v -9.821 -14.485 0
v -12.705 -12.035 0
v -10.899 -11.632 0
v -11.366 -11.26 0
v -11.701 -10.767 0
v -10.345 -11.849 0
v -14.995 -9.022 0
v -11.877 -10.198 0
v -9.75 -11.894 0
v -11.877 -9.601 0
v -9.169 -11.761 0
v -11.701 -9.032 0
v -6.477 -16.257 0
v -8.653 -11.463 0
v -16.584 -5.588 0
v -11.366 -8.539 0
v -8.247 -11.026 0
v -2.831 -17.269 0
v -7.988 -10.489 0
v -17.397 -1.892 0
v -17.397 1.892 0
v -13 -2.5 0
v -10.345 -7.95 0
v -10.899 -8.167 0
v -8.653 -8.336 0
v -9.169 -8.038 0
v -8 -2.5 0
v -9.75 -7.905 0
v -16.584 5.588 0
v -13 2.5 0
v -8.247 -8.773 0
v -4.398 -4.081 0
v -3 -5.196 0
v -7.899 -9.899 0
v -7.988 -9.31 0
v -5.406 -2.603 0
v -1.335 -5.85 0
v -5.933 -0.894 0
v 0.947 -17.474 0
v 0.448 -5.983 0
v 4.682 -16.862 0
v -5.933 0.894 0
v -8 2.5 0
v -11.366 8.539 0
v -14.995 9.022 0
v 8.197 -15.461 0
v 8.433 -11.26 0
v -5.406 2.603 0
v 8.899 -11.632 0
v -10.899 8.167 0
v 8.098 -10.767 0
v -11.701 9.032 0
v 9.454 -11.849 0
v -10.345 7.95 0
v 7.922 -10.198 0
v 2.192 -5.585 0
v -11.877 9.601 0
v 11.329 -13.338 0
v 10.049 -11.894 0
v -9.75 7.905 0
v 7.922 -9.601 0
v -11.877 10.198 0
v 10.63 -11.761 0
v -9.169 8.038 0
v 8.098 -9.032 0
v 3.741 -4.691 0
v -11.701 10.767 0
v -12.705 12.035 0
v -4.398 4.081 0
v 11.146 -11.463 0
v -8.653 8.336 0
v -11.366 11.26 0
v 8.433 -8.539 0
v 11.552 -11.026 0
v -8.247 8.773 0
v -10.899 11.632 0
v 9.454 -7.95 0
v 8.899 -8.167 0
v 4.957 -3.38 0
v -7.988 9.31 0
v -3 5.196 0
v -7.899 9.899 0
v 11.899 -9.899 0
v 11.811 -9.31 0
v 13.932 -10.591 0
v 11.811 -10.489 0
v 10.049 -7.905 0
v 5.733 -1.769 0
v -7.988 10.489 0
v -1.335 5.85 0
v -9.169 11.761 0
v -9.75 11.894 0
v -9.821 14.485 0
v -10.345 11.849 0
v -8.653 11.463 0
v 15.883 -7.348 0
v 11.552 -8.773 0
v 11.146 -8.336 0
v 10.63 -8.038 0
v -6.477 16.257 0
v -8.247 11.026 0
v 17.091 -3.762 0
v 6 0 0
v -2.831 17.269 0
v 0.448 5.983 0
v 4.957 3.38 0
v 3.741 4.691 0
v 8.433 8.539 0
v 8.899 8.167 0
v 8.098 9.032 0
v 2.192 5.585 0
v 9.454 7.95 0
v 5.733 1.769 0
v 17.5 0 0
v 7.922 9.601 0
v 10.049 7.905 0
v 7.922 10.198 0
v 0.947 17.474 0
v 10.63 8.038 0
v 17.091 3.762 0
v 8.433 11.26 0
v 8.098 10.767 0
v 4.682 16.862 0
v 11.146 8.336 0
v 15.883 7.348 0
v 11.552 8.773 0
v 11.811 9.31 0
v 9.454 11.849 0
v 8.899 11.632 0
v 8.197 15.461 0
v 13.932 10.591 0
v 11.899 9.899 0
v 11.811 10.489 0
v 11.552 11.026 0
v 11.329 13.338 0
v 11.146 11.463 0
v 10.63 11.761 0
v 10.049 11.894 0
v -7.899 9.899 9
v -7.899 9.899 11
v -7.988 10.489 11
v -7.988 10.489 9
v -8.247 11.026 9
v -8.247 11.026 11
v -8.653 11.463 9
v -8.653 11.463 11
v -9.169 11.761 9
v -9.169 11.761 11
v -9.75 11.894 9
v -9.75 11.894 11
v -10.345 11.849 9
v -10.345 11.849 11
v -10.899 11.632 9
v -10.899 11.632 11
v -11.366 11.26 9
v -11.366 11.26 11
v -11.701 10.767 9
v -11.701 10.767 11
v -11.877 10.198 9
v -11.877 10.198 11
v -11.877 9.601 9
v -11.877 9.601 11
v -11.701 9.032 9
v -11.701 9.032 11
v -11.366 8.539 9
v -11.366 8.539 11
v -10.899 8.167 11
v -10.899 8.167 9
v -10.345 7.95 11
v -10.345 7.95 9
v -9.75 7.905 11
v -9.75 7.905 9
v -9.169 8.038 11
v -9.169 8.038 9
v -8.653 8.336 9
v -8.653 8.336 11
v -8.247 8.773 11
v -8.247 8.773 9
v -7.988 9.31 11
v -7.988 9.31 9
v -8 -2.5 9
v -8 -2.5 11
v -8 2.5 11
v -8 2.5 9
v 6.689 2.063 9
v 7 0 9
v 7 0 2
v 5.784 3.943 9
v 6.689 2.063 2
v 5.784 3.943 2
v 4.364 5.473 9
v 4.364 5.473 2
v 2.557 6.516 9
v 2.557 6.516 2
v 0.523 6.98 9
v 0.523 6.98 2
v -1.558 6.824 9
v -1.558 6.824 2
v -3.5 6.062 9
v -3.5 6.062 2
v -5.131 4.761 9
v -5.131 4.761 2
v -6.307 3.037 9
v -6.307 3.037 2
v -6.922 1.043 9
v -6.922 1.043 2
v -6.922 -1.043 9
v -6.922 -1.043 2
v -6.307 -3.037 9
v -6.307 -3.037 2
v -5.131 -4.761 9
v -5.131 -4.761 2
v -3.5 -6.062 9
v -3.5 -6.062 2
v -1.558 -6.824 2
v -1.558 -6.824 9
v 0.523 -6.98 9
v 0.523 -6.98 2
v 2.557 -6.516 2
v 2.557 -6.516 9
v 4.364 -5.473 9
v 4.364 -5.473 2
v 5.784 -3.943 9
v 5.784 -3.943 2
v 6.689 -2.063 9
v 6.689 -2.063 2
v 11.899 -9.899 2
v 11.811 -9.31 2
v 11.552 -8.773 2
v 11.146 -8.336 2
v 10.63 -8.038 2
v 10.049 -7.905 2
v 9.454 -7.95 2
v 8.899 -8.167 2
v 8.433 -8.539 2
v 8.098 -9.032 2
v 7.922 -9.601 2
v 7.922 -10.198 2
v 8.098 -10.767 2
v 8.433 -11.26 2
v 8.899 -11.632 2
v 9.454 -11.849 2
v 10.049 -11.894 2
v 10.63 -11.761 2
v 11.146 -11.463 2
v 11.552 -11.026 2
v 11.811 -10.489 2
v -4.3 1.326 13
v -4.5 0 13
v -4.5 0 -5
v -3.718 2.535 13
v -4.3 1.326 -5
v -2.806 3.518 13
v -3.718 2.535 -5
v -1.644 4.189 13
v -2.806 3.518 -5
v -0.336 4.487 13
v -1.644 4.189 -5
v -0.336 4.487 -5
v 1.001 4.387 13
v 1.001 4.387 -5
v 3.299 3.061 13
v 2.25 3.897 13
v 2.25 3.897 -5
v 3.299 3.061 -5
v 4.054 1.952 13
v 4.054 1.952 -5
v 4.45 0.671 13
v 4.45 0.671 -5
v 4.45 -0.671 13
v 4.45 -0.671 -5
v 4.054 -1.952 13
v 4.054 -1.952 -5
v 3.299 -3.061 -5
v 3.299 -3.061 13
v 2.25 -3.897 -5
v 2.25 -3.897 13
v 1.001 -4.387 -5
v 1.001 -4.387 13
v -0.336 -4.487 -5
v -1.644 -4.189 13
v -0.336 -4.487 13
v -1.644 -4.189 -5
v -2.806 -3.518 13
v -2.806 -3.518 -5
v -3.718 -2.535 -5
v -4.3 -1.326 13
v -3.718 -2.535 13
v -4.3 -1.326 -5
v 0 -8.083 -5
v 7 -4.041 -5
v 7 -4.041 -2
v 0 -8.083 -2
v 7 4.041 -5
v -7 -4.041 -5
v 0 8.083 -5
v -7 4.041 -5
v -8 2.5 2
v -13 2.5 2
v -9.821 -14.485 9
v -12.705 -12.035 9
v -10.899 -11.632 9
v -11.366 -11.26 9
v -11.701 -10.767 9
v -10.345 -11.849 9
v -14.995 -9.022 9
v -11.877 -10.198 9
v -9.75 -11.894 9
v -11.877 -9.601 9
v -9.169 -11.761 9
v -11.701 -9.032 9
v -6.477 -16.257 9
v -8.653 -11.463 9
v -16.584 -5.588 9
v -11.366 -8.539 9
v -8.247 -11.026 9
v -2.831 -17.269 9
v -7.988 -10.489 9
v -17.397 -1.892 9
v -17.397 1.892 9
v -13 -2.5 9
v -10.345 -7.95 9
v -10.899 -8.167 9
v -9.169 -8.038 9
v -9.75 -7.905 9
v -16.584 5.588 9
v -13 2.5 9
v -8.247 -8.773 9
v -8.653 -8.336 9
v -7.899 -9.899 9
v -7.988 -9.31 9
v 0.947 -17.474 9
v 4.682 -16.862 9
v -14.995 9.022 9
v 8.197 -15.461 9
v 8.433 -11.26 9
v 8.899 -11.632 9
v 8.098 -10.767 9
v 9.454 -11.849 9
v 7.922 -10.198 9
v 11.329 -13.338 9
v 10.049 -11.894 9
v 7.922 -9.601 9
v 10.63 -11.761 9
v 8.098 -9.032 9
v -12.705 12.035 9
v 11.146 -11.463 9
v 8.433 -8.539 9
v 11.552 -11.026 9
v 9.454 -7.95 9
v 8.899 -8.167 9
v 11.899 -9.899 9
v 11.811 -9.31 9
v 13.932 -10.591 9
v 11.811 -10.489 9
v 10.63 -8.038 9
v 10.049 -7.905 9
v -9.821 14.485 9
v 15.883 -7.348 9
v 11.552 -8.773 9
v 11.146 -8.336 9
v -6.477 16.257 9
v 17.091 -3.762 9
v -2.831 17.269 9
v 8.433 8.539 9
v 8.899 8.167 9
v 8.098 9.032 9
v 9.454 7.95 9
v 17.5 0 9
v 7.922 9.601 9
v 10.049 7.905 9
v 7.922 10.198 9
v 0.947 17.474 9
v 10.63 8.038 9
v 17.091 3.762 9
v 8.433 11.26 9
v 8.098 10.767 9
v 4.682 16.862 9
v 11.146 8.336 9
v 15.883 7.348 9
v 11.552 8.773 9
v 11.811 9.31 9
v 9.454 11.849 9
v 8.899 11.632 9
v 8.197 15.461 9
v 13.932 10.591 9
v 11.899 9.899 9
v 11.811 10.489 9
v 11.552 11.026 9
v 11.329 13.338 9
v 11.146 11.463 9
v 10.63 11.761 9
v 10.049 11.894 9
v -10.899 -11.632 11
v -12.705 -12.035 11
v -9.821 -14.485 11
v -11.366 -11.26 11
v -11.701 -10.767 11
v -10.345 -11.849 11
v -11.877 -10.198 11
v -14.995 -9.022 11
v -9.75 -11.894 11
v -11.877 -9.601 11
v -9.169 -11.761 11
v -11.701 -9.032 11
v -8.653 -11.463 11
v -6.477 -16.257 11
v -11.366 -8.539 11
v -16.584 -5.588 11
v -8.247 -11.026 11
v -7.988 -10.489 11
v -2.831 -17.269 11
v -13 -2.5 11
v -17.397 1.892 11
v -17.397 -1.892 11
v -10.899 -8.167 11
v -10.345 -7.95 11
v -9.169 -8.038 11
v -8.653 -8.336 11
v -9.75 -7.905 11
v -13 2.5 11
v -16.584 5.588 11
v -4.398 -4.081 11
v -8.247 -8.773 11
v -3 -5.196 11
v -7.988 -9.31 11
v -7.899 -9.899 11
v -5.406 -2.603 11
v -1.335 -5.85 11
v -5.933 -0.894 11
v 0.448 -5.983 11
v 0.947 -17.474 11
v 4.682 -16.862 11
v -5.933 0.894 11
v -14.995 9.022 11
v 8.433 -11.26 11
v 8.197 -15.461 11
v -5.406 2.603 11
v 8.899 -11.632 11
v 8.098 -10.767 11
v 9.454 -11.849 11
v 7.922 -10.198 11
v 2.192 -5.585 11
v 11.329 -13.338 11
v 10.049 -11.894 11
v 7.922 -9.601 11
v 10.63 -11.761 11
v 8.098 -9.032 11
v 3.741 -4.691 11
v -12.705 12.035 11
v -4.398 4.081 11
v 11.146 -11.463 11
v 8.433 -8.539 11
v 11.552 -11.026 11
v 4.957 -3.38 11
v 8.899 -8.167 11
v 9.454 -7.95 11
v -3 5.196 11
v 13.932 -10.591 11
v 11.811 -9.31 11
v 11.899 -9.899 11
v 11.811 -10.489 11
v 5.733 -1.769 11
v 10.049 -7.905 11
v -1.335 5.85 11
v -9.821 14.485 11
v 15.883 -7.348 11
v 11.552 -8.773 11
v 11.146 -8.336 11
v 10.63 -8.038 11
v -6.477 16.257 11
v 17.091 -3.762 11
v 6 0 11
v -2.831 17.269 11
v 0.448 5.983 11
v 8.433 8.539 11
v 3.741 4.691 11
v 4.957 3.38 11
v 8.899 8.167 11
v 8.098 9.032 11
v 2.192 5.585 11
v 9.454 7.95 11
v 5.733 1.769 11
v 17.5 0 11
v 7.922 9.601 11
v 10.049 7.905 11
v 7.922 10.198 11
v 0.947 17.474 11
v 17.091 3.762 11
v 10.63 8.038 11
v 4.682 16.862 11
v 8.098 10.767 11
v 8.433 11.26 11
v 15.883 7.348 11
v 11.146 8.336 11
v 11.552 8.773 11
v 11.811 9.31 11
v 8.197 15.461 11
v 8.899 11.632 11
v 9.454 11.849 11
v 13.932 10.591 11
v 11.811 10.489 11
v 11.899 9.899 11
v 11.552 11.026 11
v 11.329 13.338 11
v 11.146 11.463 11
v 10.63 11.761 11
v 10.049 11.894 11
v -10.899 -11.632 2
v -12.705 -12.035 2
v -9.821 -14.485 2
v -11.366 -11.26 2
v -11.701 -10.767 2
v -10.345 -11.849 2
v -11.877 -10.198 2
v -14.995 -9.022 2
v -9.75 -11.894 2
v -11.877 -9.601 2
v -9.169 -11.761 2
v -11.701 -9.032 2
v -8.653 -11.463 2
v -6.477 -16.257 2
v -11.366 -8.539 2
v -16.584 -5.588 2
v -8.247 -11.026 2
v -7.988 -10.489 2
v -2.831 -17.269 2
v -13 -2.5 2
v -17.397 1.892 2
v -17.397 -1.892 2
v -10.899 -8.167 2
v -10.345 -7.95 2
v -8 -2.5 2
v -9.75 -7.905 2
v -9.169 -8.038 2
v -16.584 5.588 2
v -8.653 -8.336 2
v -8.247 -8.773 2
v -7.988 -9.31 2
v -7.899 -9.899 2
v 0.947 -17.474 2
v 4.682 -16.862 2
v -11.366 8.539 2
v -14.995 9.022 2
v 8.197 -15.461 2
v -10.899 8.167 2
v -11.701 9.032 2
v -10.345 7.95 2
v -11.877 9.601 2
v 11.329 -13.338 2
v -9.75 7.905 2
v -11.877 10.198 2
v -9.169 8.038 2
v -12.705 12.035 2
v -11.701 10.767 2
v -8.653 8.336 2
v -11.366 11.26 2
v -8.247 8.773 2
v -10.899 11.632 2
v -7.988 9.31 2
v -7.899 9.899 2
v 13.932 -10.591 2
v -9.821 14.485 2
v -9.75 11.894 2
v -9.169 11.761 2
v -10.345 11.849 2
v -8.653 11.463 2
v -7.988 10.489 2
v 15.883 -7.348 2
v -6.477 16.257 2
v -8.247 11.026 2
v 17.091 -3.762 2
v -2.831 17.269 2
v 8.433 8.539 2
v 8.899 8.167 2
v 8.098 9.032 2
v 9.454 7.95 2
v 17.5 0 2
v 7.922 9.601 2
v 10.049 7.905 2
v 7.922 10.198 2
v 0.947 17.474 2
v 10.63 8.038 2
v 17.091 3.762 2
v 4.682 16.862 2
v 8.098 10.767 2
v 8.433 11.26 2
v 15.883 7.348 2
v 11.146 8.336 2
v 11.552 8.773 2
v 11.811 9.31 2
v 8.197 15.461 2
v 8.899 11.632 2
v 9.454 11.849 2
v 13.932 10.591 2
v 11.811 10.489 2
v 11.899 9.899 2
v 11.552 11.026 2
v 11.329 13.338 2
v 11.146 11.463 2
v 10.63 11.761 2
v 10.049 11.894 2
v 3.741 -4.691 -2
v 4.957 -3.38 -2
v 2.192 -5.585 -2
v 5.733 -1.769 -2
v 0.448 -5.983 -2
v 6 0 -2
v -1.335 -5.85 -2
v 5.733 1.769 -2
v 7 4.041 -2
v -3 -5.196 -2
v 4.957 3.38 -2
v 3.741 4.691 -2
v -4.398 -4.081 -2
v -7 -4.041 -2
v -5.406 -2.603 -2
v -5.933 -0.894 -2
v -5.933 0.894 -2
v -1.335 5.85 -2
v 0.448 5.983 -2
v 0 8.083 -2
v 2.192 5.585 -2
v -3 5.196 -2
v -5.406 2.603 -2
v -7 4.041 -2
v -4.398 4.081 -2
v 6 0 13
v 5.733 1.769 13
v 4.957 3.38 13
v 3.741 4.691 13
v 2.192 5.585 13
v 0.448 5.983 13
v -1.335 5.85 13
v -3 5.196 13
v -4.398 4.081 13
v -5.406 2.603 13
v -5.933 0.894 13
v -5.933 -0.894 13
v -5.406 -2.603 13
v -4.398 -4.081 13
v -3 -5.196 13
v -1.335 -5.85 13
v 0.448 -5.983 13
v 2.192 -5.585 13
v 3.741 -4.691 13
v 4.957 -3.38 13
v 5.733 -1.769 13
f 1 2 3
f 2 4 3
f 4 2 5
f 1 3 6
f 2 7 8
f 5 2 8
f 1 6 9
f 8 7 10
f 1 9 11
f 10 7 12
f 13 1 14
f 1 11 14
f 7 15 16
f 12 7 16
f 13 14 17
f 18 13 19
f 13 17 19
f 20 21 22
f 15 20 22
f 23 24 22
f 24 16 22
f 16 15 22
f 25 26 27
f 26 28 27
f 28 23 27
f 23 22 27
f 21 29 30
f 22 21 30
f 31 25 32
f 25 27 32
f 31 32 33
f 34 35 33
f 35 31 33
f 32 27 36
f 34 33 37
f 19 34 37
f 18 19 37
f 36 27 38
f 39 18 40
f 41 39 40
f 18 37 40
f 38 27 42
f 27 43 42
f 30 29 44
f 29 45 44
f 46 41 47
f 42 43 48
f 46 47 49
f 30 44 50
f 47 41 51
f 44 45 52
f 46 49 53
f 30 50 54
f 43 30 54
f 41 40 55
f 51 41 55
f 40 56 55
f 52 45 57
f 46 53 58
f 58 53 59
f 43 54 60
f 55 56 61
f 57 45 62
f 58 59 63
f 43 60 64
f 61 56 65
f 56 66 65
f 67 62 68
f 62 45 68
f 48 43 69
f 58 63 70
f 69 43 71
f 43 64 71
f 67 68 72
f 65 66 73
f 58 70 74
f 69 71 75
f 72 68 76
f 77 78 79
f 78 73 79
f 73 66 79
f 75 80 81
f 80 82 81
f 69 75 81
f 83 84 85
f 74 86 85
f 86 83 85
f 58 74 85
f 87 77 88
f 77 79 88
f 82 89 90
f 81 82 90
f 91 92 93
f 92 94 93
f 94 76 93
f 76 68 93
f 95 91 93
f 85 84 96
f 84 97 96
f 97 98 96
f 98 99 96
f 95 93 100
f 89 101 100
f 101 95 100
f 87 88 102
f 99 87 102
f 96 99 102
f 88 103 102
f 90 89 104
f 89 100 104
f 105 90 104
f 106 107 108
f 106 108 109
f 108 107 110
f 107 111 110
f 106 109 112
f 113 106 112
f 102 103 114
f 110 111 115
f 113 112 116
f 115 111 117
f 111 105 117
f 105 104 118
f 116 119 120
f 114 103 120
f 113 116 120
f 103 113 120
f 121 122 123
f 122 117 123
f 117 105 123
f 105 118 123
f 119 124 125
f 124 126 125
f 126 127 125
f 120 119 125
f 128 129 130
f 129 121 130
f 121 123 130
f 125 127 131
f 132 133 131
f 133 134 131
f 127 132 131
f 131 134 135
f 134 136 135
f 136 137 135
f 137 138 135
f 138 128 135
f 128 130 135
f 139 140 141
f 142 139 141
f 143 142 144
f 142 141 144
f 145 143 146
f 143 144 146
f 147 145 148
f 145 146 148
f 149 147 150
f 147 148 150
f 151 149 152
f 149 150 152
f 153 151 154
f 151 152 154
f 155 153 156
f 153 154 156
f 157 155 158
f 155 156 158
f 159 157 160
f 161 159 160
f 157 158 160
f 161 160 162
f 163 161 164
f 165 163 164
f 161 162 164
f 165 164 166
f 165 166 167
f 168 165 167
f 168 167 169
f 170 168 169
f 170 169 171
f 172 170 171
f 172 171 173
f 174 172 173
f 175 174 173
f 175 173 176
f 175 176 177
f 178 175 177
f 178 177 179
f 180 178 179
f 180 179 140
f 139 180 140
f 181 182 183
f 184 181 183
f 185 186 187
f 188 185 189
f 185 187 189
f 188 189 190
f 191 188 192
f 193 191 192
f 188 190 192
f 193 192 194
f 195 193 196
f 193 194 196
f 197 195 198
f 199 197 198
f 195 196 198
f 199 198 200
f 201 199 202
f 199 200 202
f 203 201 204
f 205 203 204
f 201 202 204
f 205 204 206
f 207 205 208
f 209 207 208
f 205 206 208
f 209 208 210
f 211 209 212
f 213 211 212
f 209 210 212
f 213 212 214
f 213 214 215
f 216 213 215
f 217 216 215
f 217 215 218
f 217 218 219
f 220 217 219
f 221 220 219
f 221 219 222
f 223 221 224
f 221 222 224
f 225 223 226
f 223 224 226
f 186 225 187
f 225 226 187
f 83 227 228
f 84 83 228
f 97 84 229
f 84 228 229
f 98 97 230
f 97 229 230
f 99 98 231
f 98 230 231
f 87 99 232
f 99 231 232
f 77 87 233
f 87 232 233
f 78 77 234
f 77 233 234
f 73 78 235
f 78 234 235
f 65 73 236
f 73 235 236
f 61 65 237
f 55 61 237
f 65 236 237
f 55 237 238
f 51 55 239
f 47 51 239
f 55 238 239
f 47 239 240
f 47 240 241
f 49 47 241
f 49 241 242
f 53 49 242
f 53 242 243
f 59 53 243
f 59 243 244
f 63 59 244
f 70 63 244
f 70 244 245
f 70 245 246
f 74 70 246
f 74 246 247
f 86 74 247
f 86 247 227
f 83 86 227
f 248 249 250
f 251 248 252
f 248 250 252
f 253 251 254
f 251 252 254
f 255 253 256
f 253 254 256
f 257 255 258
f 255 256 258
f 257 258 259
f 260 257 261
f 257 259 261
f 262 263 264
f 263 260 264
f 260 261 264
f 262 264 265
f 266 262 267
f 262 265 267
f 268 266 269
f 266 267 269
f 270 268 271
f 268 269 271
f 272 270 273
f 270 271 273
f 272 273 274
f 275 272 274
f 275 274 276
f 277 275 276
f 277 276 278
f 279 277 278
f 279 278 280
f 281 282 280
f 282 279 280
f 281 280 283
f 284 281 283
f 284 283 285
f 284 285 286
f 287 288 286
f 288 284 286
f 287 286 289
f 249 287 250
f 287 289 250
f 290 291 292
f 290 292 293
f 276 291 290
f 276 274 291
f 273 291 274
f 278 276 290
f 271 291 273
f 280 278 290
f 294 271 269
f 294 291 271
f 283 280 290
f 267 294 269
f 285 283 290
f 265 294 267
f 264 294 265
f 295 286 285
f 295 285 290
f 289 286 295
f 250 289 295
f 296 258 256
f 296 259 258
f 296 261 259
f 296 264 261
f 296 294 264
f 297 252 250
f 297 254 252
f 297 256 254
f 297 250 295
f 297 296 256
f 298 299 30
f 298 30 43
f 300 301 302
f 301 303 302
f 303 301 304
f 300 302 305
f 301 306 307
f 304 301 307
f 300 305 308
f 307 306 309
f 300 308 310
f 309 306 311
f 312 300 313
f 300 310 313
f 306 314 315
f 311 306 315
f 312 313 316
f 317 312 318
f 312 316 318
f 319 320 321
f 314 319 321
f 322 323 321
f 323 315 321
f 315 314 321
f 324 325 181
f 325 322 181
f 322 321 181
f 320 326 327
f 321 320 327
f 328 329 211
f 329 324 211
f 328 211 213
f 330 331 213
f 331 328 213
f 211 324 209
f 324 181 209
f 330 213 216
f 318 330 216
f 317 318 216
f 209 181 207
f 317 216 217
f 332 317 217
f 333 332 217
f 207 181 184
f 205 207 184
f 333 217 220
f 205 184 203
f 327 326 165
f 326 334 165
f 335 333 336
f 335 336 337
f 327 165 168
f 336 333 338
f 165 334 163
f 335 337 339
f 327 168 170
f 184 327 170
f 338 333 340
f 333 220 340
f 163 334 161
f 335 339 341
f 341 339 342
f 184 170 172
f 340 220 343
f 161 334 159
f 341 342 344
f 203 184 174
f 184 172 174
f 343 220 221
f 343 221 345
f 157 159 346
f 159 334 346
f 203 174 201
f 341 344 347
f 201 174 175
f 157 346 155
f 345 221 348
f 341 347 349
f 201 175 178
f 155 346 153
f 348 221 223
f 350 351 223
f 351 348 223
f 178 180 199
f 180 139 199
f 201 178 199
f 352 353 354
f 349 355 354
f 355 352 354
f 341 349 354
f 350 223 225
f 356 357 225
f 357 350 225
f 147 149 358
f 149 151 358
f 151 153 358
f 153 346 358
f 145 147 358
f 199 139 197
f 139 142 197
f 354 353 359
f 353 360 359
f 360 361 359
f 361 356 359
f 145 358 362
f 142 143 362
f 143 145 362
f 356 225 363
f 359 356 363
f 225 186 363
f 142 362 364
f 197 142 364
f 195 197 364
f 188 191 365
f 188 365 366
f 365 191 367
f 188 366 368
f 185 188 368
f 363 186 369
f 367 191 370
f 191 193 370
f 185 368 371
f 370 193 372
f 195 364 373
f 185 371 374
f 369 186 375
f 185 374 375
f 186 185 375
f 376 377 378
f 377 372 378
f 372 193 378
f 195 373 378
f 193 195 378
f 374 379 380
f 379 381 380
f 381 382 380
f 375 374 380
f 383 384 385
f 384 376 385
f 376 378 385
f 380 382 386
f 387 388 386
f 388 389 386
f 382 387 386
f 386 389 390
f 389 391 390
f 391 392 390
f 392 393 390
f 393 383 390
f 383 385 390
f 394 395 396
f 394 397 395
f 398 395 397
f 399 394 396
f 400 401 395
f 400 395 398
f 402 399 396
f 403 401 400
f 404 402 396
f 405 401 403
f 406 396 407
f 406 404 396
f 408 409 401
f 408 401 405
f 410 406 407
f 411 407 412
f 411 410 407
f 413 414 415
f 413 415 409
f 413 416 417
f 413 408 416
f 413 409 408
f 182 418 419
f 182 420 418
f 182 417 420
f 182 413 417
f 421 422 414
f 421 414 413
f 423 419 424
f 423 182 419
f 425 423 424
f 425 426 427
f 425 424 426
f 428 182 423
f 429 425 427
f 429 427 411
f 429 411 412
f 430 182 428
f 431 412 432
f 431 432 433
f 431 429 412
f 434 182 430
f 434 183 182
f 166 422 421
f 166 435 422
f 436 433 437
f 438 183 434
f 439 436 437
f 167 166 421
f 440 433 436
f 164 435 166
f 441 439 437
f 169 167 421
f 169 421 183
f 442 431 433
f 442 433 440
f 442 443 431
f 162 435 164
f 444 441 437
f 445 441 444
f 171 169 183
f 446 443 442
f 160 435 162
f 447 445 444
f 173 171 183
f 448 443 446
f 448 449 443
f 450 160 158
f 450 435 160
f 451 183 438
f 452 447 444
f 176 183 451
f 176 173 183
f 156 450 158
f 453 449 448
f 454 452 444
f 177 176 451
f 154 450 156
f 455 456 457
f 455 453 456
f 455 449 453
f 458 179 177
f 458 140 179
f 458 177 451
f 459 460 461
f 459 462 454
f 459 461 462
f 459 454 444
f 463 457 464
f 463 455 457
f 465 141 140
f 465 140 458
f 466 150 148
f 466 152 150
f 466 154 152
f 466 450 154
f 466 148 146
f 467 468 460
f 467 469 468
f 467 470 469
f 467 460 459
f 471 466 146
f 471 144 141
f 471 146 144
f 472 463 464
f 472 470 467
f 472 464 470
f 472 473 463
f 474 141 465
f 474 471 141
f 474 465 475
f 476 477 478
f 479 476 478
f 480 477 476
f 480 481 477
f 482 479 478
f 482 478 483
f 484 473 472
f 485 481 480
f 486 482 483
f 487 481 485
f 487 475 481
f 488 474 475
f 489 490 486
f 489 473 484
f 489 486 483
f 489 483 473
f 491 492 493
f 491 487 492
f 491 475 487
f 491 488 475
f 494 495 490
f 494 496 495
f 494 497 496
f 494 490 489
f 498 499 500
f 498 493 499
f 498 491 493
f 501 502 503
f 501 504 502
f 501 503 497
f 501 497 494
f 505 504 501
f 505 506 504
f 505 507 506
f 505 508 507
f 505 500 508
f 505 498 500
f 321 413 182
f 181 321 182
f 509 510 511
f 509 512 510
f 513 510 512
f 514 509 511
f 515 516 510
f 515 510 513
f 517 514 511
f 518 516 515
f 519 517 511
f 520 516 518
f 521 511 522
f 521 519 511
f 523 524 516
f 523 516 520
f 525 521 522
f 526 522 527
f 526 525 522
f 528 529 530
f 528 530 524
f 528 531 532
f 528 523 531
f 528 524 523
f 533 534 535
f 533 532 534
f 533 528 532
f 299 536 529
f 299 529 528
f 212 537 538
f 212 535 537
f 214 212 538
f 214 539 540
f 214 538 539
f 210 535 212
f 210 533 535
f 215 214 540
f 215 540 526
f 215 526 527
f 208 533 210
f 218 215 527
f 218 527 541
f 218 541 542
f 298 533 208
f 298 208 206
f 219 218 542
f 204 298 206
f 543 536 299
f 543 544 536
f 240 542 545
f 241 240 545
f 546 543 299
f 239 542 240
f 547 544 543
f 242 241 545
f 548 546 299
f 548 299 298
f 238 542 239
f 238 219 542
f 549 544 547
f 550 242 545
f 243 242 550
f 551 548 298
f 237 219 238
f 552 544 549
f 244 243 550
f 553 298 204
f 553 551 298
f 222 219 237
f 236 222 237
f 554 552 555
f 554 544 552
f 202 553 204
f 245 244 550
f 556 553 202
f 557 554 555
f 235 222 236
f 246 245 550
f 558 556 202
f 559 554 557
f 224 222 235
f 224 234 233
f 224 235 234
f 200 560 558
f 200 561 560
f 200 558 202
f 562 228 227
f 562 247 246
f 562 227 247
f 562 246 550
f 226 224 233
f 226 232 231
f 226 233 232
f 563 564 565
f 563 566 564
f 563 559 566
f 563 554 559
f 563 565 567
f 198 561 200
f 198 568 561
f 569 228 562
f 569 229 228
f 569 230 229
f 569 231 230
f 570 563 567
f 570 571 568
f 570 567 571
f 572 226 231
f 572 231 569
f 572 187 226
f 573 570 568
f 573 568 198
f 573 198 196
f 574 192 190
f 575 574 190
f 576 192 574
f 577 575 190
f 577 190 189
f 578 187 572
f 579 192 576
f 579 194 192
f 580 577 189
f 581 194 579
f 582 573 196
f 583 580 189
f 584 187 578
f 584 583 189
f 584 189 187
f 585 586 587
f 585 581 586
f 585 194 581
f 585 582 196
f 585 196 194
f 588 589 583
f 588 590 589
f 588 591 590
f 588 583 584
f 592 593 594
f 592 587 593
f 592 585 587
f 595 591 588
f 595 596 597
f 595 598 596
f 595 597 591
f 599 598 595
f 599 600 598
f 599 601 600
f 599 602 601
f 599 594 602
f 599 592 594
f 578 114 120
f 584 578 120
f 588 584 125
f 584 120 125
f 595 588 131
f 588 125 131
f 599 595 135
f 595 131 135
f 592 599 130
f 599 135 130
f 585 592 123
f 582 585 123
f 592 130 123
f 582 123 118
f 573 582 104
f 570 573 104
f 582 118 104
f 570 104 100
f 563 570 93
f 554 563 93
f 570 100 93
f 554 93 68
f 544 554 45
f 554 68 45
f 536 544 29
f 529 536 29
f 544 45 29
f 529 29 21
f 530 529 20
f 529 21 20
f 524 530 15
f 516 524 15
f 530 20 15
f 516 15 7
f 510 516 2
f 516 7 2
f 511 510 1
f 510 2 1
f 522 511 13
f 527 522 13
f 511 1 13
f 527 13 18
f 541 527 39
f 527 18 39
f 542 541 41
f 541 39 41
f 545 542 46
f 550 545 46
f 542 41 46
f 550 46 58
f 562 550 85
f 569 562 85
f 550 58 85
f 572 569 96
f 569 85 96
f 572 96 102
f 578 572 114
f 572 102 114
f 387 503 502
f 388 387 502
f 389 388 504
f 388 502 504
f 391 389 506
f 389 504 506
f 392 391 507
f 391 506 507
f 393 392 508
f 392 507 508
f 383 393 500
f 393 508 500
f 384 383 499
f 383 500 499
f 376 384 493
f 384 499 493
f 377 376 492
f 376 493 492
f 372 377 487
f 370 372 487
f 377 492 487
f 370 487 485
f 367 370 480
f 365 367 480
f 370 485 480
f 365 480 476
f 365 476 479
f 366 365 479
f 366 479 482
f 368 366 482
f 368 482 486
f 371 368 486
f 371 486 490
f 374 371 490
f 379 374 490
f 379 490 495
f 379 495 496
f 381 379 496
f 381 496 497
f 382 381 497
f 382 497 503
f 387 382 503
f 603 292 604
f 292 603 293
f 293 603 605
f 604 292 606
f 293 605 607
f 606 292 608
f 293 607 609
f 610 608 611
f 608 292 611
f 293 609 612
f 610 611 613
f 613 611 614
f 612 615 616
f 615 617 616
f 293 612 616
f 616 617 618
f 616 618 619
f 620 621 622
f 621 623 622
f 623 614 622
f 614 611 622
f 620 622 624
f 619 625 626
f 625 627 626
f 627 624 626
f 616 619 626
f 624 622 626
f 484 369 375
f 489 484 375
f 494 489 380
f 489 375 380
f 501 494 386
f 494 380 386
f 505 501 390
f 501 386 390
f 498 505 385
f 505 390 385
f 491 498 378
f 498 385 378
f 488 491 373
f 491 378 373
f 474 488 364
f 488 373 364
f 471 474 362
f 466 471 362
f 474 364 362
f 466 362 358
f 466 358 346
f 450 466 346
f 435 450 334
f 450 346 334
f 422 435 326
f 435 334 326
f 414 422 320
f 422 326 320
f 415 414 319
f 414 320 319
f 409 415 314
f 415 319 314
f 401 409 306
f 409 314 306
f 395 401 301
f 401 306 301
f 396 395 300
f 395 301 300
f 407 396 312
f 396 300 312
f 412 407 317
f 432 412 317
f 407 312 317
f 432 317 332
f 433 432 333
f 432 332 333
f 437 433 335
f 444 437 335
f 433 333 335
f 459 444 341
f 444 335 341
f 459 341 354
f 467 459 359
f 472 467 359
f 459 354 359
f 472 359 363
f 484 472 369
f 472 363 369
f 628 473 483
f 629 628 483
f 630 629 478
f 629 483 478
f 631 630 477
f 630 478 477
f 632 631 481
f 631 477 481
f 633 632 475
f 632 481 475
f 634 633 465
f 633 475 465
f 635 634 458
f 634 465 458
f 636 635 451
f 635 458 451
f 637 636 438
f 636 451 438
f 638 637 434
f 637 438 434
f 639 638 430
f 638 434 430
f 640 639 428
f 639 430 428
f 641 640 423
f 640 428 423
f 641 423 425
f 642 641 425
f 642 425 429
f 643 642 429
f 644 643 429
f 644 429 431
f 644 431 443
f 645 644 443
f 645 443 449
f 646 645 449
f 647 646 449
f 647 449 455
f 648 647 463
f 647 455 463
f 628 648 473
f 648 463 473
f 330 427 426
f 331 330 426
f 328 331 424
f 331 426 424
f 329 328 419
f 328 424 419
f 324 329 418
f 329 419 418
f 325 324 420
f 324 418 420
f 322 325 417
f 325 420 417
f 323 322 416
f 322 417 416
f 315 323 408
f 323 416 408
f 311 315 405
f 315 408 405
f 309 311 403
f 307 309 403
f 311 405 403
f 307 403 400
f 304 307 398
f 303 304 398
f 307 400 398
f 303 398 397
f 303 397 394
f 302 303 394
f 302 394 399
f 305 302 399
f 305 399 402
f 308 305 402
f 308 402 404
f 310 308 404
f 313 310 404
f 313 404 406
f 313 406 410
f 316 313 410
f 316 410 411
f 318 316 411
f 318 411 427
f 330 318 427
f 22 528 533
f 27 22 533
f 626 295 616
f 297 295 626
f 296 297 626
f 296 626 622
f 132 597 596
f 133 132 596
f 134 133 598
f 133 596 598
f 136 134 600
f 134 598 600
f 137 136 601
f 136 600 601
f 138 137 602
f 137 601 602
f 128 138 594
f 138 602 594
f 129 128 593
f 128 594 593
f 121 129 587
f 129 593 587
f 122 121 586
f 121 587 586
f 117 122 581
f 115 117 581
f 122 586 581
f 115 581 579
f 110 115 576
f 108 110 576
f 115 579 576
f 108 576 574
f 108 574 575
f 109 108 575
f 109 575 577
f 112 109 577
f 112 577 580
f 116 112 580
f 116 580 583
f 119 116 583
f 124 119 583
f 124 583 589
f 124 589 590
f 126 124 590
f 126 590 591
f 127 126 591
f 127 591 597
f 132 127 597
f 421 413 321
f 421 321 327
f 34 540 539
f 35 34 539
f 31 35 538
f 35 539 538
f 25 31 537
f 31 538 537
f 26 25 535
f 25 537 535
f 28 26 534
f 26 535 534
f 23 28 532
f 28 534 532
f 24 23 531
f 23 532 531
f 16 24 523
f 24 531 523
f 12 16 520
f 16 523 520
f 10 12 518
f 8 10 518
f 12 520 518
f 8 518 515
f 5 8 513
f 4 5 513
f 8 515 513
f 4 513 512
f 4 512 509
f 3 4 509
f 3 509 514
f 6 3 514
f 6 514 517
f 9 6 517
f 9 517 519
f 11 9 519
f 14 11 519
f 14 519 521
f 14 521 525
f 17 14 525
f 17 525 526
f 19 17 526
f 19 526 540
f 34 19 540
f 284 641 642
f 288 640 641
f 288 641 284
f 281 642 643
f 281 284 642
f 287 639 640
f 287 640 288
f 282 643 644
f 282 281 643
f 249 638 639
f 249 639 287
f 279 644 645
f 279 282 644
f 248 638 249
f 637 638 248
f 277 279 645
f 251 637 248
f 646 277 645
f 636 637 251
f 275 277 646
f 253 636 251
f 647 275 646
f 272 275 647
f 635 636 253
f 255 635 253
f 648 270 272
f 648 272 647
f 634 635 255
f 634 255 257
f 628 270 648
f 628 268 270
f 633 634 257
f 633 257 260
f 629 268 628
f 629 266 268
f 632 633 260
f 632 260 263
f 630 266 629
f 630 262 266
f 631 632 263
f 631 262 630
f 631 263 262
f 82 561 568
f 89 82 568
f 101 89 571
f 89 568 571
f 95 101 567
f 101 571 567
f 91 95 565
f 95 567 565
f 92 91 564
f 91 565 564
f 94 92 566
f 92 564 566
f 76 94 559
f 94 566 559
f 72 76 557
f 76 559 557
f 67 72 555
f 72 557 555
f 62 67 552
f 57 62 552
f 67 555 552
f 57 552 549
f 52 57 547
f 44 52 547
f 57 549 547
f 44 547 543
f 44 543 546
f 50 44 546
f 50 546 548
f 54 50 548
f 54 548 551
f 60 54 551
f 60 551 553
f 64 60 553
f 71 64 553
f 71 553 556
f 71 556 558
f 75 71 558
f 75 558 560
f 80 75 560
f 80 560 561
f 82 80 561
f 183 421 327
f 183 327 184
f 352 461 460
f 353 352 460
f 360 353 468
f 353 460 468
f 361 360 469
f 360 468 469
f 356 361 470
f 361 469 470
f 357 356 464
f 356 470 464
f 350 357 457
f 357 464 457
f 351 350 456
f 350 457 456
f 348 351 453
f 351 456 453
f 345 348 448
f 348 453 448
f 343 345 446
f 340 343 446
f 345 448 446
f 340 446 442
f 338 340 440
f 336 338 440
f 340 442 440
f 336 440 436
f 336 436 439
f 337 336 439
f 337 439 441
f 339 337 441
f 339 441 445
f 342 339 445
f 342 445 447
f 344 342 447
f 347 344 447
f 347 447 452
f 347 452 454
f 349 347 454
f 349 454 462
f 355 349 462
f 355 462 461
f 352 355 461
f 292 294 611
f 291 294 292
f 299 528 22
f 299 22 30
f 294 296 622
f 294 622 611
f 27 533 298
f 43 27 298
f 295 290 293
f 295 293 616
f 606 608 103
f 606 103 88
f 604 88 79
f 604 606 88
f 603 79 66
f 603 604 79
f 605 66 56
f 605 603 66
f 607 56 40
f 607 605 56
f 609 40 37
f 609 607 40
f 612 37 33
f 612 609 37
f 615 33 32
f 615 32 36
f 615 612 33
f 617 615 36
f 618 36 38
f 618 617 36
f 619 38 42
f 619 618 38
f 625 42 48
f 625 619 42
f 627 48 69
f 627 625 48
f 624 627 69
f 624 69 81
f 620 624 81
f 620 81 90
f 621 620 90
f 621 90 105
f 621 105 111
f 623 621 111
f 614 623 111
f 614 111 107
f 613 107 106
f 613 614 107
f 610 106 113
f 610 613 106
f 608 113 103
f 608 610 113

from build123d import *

# Parameters (mm, degrees)
SKETCH_1_R          = 17.5
EXTRUDE_1_DEPTH     = 2
SKETCH_2_R          = 7
EXTRUDE_2_DEPTH     = 7
SKETCH_3_R          = 17.5
EXTRUDE_3_DEPTH     = 2
SKETCH_4_W          = 5
SKETCH_4_H          = 5
CUT_EXTRUDE_1_DEPTH = 18
SKETCH_5_R          = 4.5
CUT_EXTRUDE_2_DEPTH = 18
SKETCH_6_R          = 6
SKETCH_6_R_2        = 4.5
EXTRUDE_4_DEPTH     = 2
SKETCH_7_R          = 2
CUT_EXTRUDE_3_DEPTH = 20
EXTRUDE_START       = 2
SKETCH_8_R          = 6
SKETCH_8_R_2        = 4.5
EXTRUDE_5_DEPTH     = 2
EXTRUDE_START_2     = 3
SKETCH_10_R         = 4.5
EXTRUDE_6_DEPTH     = 3


with BuildPart() as part:
    # 草图1 → 凸台-拉伸1 (new body)
    with BuildSketch(Plane.XY):
        Circle(SKETCH_1_R)
    extrude(amount=EXTRUDE_1_DEPTH)

    # 草图2 → 凸台-拉伸2 (add)
    with BuildSketch(Plane.XY.offset(2)):
        Circle(SKETCH_2_R)
    extrude(amount=EXTRUDE_2_DEPTH)

    # 草图3 → 凸台-拉伸3 (add)
    with BuildSketch(Plane.XY.offset(9)):
        Circle(SKETCH_3_R)
    extrude(amount=EXTRUDE_3_DEPTH)

    # 草图4 → 切除-拉伸1 (cut)
    with BuildSketch(Plane.XY.offset(11)):
        with Locations((-10.5, 0)):
            Rectangle(SKETCH_4_W, SKETCH_4_H)
    extrude(amount=-CUT_EXTRUDE_1_DEPTH, mode=Mode.SUBTRACT)

    # 草图5 → 切除-拉伸2 (cut)
    with BuildSketch(Plane(origin=(0, 0, 0), x_dir=(-1, 0, 0), z_dir=(0, 0, -1))):
        Circle(SKETCH_5_R)
    extrude(amount=-CUT_EXTRUDE_2_DEPTH, mode=Mode.SUBTRACT)

    # 草图6 → 凸台-拉伸4 (add)
    with BuildSketch(Plane.XY.offset(11)):
        Circle(SKETCH_6_R)
        with Locations(Location((0, 0, 0), (0, 0, 180))):
            Circle(SKETCH_6_R_2, mode=Mode.SUBTRACT)
    extrude(amount=EXTRUDE_4_DEPTH)

    # 草图7 → 切除-拉伸3 (cut)
    with BuildSketch(Plane.XY.offset(11)):
        with Locations((-9.899494937, 9.899494937)):
            Circle(SKETCH_7_R)
        with Locations((9.899494937, 9.899494937)):
            Circle(SKETCH_7_R)
        with Locations((9.899494937, -9.899494937)):
            Circle(SKETCH_7_R)
        with Locations((-9.899494937, -9.899494937)):
            Circle(SKETCH_7_R)
    extrude(amount=-CUT_EXTRUDE_3_DEPTH, mode=Mode.SUBTRACT)

    # 草图8 → 凸台-拉伸5 (add)
    with BuildSketch(Plane(origin=(0, 0, 0), x_dir=(-1, 0, 0), z_dir=(0, 0, -1)).offset(EXTRUDE_START)):
        with Locations(Location((0, 0, 0), (0, 0, 180))):
            Circle(SKETCH_8_R)
        Circle(SKETCH_8_R_2, mode=Mode.SUBTRACT)
    extrude(amount=-EXTRUDE_5_DEPTH)

    # 草图10 → 凸台-拉伸6 (add)
    with BuildSketch(Plane(origin=(0, 0, -2), x_dir=(-1, 0, 0), z_dir=(0, 0, -1)).offset(EXTRUDE_START_2)):
        Polygon((0, 8.082903769), (-7, 4.041451884), (-7, -4.041451884), (0, -8.082903769), (7, -4.041451884), (7, 4.041451884), align=None)
        Circle(SKETCH_10_R, mode=Mode.SUBTRACT)
    extrude(amount=-EXTRUDE_6_DEPTH)


solid = part.part
